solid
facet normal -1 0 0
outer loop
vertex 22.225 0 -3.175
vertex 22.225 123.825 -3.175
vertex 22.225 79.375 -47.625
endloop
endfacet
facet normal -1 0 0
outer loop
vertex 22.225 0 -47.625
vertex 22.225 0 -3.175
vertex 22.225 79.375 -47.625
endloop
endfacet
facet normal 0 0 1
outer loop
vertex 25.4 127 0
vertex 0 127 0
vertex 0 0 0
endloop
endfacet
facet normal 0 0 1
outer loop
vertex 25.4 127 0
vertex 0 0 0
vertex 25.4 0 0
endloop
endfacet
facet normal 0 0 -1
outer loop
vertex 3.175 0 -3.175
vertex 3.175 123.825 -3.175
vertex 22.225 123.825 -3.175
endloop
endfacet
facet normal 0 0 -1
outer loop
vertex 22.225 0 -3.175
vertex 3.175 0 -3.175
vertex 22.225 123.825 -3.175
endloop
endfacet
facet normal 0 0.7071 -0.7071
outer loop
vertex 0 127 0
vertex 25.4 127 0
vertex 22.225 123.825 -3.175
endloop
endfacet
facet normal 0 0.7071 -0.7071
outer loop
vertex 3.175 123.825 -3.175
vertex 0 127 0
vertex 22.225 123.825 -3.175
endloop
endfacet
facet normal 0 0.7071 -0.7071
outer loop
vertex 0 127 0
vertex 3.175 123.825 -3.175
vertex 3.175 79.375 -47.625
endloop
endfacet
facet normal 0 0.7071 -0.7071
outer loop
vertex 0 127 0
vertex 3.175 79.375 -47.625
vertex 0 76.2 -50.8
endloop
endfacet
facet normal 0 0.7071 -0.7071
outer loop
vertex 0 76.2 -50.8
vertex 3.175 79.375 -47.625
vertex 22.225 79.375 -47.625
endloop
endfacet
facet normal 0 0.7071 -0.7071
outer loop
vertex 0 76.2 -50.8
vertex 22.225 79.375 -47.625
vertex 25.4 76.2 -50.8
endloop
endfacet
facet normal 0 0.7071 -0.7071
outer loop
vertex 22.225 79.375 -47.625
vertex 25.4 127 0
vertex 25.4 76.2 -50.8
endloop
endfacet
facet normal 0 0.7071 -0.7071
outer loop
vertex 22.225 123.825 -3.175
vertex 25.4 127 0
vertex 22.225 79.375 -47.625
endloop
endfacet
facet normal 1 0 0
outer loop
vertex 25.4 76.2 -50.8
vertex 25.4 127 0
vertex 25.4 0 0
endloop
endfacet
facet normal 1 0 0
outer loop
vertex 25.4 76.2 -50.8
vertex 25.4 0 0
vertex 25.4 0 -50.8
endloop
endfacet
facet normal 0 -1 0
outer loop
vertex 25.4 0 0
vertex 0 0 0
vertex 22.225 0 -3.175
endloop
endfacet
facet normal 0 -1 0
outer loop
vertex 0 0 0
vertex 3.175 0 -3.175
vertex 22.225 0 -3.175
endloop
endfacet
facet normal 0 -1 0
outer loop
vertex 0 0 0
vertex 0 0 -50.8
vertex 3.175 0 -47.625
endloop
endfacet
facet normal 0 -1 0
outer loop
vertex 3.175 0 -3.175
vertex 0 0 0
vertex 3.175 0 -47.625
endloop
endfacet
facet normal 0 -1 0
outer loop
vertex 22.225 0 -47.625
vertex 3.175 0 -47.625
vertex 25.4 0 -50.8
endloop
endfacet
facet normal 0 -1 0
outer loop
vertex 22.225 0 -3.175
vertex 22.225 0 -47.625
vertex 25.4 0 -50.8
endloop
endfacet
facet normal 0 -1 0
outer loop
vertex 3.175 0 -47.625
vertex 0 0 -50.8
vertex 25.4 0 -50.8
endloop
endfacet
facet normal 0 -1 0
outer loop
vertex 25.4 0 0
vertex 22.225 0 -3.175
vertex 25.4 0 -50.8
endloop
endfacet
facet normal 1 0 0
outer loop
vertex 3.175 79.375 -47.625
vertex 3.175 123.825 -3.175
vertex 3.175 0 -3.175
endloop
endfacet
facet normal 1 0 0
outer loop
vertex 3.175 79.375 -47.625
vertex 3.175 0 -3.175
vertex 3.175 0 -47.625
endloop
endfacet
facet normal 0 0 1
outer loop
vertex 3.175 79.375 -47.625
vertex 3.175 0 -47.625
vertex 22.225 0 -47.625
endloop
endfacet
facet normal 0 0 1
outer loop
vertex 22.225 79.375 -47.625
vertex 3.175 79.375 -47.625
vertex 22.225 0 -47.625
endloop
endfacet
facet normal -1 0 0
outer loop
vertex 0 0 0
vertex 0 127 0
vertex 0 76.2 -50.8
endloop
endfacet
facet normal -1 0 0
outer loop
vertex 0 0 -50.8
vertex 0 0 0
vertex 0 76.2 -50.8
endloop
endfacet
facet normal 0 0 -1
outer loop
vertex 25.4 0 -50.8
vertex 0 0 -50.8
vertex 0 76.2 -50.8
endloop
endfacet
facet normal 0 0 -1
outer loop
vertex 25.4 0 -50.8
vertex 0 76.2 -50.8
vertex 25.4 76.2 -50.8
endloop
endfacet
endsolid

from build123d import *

# Parameters (mm, degrees)
SKETCH1_W           = 25.4
SKETCH1_H           = 50.8
SKETCH1_W_2         = 19.05
SKETCH1_H_2         = 44.45
BOSS_EXTRUDE1_DEPTH = 127
CUT_EXTRUDE1_DEPTH  = 127


with BuildPart() as part:
    # Sketch1 → Boss-Extrude1 (new body)
    with BuildSketch(Plane(origin=(0, 0, 0), x_dir=(1, 0, 0), z_dir=(0, 1, 0))):
        with Locations((12.7, 25.4)):
            Rectangle(SKETCH1_W, SKETCH1_H)
        with Locations((12.7, 25.4)):
            Rectangle(SKETCH1_W_2, SKETCH1_H_2, mode=Mode.SUBTRACT)
    extrude(amount=BOSS_EXTRUDE1_DEPTH)

    # Sketch2 → Cut-Extrude1 (cut)
    with BuildSketch(Plane(origin=(25.4, 0, 0), x_dir=(0, 0, -1), z_dir=(1, 0, 0))):
        Polygon((0, 127), (50.8, 76.2), (50.8, 127), align=None)
    extrude(amount=-CUT_EXTRUDE1_DEPTH, mode=Mode.SUBTRACT)


solid = part.part
